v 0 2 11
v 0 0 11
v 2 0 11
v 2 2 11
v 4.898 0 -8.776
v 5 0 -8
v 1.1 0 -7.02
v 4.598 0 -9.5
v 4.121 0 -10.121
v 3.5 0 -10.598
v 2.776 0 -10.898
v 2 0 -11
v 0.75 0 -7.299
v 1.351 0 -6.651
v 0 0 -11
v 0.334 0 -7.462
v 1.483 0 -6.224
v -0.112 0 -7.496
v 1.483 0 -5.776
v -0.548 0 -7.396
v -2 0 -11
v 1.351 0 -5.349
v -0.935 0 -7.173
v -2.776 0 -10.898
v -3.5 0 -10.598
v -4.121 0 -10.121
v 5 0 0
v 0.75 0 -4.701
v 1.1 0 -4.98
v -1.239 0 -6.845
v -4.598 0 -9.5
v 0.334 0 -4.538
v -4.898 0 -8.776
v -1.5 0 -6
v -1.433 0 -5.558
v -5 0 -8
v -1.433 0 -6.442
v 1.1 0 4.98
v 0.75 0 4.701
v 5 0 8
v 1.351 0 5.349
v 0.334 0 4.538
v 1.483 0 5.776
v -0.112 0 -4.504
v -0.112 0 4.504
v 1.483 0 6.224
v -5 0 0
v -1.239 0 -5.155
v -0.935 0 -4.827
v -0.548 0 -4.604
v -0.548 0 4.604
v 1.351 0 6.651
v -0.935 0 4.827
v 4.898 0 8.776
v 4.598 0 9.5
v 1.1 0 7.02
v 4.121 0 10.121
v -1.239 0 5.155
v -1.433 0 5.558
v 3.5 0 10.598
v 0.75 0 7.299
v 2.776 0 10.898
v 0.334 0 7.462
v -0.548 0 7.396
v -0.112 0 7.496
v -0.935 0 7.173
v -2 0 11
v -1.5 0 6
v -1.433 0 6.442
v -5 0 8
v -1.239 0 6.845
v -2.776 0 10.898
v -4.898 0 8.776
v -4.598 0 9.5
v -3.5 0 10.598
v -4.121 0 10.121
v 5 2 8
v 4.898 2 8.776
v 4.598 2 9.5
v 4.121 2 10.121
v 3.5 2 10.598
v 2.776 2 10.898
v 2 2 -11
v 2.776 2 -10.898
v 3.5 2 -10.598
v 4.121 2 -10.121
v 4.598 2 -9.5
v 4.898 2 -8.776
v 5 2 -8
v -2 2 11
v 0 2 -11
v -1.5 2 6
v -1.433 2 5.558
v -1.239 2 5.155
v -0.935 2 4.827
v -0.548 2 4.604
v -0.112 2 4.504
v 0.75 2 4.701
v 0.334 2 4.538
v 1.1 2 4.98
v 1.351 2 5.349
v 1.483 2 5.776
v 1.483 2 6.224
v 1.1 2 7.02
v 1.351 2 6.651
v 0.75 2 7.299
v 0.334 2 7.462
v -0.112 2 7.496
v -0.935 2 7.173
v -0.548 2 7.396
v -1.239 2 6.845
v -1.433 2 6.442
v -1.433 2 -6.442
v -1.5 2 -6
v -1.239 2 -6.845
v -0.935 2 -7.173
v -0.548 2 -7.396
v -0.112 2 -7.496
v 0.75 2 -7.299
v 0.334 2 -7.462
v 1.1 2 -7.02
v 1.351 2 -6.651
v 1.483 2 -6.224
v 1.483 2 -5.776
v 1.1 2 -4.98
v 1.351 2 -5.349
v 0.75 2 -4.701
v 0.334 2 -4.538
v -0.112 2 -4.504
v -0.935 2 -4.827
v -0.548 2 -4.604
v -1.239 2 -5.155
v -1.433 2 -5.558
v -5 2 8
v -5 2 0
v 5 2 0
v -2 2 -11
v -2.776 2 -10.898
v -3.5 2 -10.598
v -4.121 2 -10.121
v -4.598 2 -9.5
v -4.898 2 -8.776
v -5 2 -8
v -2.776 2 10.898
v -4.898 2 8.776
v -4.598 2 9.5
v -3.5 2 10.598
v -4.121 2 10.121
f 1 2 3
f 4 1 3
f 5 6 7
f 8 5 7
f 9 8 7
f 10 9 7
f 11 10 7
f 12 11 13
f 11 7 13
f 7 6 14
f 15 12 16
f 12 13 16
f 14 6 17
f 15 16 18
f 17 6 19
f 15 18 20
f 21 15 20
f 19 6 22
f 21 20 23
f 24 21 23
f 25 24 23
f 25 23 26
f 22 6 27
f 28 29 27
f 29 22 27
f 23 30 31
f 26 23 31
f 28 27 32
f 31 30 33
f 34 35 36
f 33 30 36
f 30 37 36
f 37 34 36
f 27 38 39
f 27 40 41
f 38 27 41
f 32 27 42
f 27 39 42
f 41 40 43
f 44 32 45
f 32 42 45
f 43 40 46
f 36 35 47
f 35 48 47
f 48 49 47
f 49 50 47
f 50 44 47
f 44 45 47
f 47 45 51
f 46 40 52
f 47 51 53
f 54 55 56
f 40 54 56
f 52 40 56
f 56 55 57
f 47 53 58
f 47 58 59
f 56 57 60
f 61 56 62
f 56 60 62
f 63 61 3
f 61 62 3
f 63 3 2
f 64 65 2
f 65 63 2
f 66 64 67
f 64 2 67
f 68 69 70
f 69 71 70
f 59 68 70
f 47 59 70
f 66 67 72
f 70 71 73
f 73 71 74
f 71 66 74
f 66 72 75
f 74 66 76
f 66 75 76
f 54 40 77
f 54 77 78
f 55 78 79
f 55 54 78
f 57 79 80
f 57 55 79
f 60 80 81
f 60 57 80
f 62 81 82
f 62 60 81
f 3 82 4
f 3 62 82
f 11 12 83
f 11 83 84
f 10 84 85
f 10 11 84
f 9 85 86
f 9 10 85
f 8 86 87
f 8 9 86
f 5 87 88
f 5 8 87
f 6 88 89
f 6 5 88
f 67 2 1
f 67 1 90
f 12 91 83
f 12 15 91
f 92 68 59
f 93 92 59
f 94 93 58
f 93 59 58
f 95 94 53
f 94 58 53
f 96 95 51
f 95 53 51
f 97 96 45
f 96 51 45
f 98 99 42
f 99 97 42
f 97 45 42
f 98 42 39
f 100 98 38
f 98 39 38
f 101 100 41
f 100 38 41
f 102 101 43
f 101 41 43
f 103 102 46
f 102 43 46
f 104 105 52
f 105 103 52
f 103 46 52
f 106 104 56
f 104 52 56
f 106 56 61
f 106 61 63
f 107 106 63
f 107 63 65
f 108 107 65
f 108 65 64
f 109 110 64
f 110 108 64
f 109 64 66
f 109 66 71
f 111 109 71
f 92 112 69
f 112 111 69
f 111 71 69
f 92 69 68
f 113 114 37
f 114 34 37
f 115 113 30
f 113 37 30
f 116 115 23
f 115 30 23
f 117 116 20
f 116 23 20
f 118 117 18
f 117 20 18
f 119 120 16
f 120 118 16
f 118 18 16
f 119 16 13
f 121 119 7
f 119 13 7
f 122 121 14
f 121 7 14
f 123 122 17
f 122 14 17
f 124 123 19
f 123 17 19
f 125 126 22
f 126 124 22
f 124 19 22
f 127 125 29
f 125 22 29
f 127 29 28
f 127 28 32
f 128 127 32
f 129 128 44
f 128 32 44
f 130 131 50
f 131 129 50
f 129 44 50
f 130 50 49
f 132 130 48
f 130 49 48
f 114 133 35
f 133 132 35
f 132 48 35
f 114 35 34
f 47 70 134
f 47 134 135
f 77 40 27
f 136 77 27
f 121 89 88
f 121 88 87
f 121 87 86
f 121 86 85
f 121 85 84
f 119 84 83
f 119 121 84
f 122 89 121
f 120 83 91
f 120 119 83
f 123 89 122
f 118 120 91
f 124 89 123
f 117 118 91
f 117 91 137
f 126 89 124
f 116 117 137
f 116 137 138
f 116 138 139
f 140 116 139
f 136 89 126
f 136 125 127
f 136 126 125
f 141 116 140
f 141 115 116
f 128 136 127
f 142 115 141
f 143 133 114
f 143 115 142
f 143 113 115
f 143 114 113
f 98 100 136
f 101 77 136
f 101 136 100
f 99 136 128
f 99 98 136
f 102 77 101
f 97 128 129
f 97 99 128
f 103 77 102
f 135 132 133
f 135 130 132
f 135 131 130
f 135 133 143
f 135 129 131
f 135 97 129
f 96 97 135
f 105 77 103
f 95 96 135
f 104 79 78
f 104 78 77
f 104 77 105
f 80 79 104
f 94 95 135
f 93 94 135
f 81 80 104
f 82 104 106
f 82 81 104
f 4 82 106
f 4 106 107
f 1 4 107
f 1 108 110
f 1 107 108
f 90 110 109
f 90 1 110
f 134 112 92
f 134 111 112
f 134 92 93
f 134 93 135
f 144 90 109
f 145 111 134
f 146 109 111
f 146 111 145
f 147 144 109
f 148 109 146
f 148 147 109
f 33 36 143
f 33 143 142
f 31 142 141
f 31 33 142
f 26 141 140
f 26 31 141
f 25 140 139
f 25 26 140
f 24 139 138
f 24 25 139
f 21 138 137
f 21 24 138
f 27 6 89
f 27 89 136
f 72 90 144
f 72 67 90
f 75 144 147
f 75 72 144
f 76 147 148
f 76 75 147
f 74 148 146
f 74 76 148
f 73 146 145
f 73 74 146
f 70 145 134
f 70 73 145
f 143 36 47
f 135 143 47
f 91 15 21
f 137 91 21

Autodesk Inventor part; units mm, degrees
ref_plane "YZ Plane" through (0, 0, 0) normal (1, 0, 0) x (0, 1, 0)
ref_plane "XZ Plane" through (0, 0, 0) normal (0, 1, 0) x (-1, 0, 0)
ref_plane "XY Plane" through (0, 0, 0) normal (0, 0, 1) x (1, 0, 0)
sketch "Sketch1" plane through (0, 0, 0) normal (0, 1, 0) x (-1, 0, 0)
  line L0 (1.5875, 0) -> (-2.17, 0) construction
  line L1 (0, 2.1822) -> (0, -1.8687) construction
  circle A0 centre (0, 6) radius 1.5
  line L2 (0, 11) -> (2, 11)
  line L3 (5, 8) -> (5, 0)
  arc A1 (5, 8) -> (2, 11) centre (2, 8) ccw
  line L4 (0, 11) -> (-2, 11)
  line L5 (-5, 8) -> (-5, 0)
  arc A2 (-2, 11) -> (-5, 8) centre (-2, 8) ccw
  circle A3 centre (0, -6) radius 1.5
  line L6 (0, -11) -> (2, -11)
  line L7 (5, -8) -> (5, 0)
  arc A4 (2, -11) -> (5, -8) centre (2, -8) ccw
  line L8 (-5, -8) -> (-5, 0)
  arc A5 (-5, -8) -> (-2, -11) centre (-2, -8) ccw
  line L9 (0, -11) -> (-2, -11)
  point P0 (0, 0)
  point P1 (5, 11)
  point P2 (-5, 11)
  point P3 (5, -11)
  point P4 (-5, -11)
  dimension "d0" = 3
  dimension "d1" = 6
  dimension "d2" = 5
  dimension "d3" = 5
  dimension "d4" = 3
extrude "Extrusion1" add sketch "Sketch1" along normal blind 2
properties part number "Konektor Casis 2_3DPrint"
